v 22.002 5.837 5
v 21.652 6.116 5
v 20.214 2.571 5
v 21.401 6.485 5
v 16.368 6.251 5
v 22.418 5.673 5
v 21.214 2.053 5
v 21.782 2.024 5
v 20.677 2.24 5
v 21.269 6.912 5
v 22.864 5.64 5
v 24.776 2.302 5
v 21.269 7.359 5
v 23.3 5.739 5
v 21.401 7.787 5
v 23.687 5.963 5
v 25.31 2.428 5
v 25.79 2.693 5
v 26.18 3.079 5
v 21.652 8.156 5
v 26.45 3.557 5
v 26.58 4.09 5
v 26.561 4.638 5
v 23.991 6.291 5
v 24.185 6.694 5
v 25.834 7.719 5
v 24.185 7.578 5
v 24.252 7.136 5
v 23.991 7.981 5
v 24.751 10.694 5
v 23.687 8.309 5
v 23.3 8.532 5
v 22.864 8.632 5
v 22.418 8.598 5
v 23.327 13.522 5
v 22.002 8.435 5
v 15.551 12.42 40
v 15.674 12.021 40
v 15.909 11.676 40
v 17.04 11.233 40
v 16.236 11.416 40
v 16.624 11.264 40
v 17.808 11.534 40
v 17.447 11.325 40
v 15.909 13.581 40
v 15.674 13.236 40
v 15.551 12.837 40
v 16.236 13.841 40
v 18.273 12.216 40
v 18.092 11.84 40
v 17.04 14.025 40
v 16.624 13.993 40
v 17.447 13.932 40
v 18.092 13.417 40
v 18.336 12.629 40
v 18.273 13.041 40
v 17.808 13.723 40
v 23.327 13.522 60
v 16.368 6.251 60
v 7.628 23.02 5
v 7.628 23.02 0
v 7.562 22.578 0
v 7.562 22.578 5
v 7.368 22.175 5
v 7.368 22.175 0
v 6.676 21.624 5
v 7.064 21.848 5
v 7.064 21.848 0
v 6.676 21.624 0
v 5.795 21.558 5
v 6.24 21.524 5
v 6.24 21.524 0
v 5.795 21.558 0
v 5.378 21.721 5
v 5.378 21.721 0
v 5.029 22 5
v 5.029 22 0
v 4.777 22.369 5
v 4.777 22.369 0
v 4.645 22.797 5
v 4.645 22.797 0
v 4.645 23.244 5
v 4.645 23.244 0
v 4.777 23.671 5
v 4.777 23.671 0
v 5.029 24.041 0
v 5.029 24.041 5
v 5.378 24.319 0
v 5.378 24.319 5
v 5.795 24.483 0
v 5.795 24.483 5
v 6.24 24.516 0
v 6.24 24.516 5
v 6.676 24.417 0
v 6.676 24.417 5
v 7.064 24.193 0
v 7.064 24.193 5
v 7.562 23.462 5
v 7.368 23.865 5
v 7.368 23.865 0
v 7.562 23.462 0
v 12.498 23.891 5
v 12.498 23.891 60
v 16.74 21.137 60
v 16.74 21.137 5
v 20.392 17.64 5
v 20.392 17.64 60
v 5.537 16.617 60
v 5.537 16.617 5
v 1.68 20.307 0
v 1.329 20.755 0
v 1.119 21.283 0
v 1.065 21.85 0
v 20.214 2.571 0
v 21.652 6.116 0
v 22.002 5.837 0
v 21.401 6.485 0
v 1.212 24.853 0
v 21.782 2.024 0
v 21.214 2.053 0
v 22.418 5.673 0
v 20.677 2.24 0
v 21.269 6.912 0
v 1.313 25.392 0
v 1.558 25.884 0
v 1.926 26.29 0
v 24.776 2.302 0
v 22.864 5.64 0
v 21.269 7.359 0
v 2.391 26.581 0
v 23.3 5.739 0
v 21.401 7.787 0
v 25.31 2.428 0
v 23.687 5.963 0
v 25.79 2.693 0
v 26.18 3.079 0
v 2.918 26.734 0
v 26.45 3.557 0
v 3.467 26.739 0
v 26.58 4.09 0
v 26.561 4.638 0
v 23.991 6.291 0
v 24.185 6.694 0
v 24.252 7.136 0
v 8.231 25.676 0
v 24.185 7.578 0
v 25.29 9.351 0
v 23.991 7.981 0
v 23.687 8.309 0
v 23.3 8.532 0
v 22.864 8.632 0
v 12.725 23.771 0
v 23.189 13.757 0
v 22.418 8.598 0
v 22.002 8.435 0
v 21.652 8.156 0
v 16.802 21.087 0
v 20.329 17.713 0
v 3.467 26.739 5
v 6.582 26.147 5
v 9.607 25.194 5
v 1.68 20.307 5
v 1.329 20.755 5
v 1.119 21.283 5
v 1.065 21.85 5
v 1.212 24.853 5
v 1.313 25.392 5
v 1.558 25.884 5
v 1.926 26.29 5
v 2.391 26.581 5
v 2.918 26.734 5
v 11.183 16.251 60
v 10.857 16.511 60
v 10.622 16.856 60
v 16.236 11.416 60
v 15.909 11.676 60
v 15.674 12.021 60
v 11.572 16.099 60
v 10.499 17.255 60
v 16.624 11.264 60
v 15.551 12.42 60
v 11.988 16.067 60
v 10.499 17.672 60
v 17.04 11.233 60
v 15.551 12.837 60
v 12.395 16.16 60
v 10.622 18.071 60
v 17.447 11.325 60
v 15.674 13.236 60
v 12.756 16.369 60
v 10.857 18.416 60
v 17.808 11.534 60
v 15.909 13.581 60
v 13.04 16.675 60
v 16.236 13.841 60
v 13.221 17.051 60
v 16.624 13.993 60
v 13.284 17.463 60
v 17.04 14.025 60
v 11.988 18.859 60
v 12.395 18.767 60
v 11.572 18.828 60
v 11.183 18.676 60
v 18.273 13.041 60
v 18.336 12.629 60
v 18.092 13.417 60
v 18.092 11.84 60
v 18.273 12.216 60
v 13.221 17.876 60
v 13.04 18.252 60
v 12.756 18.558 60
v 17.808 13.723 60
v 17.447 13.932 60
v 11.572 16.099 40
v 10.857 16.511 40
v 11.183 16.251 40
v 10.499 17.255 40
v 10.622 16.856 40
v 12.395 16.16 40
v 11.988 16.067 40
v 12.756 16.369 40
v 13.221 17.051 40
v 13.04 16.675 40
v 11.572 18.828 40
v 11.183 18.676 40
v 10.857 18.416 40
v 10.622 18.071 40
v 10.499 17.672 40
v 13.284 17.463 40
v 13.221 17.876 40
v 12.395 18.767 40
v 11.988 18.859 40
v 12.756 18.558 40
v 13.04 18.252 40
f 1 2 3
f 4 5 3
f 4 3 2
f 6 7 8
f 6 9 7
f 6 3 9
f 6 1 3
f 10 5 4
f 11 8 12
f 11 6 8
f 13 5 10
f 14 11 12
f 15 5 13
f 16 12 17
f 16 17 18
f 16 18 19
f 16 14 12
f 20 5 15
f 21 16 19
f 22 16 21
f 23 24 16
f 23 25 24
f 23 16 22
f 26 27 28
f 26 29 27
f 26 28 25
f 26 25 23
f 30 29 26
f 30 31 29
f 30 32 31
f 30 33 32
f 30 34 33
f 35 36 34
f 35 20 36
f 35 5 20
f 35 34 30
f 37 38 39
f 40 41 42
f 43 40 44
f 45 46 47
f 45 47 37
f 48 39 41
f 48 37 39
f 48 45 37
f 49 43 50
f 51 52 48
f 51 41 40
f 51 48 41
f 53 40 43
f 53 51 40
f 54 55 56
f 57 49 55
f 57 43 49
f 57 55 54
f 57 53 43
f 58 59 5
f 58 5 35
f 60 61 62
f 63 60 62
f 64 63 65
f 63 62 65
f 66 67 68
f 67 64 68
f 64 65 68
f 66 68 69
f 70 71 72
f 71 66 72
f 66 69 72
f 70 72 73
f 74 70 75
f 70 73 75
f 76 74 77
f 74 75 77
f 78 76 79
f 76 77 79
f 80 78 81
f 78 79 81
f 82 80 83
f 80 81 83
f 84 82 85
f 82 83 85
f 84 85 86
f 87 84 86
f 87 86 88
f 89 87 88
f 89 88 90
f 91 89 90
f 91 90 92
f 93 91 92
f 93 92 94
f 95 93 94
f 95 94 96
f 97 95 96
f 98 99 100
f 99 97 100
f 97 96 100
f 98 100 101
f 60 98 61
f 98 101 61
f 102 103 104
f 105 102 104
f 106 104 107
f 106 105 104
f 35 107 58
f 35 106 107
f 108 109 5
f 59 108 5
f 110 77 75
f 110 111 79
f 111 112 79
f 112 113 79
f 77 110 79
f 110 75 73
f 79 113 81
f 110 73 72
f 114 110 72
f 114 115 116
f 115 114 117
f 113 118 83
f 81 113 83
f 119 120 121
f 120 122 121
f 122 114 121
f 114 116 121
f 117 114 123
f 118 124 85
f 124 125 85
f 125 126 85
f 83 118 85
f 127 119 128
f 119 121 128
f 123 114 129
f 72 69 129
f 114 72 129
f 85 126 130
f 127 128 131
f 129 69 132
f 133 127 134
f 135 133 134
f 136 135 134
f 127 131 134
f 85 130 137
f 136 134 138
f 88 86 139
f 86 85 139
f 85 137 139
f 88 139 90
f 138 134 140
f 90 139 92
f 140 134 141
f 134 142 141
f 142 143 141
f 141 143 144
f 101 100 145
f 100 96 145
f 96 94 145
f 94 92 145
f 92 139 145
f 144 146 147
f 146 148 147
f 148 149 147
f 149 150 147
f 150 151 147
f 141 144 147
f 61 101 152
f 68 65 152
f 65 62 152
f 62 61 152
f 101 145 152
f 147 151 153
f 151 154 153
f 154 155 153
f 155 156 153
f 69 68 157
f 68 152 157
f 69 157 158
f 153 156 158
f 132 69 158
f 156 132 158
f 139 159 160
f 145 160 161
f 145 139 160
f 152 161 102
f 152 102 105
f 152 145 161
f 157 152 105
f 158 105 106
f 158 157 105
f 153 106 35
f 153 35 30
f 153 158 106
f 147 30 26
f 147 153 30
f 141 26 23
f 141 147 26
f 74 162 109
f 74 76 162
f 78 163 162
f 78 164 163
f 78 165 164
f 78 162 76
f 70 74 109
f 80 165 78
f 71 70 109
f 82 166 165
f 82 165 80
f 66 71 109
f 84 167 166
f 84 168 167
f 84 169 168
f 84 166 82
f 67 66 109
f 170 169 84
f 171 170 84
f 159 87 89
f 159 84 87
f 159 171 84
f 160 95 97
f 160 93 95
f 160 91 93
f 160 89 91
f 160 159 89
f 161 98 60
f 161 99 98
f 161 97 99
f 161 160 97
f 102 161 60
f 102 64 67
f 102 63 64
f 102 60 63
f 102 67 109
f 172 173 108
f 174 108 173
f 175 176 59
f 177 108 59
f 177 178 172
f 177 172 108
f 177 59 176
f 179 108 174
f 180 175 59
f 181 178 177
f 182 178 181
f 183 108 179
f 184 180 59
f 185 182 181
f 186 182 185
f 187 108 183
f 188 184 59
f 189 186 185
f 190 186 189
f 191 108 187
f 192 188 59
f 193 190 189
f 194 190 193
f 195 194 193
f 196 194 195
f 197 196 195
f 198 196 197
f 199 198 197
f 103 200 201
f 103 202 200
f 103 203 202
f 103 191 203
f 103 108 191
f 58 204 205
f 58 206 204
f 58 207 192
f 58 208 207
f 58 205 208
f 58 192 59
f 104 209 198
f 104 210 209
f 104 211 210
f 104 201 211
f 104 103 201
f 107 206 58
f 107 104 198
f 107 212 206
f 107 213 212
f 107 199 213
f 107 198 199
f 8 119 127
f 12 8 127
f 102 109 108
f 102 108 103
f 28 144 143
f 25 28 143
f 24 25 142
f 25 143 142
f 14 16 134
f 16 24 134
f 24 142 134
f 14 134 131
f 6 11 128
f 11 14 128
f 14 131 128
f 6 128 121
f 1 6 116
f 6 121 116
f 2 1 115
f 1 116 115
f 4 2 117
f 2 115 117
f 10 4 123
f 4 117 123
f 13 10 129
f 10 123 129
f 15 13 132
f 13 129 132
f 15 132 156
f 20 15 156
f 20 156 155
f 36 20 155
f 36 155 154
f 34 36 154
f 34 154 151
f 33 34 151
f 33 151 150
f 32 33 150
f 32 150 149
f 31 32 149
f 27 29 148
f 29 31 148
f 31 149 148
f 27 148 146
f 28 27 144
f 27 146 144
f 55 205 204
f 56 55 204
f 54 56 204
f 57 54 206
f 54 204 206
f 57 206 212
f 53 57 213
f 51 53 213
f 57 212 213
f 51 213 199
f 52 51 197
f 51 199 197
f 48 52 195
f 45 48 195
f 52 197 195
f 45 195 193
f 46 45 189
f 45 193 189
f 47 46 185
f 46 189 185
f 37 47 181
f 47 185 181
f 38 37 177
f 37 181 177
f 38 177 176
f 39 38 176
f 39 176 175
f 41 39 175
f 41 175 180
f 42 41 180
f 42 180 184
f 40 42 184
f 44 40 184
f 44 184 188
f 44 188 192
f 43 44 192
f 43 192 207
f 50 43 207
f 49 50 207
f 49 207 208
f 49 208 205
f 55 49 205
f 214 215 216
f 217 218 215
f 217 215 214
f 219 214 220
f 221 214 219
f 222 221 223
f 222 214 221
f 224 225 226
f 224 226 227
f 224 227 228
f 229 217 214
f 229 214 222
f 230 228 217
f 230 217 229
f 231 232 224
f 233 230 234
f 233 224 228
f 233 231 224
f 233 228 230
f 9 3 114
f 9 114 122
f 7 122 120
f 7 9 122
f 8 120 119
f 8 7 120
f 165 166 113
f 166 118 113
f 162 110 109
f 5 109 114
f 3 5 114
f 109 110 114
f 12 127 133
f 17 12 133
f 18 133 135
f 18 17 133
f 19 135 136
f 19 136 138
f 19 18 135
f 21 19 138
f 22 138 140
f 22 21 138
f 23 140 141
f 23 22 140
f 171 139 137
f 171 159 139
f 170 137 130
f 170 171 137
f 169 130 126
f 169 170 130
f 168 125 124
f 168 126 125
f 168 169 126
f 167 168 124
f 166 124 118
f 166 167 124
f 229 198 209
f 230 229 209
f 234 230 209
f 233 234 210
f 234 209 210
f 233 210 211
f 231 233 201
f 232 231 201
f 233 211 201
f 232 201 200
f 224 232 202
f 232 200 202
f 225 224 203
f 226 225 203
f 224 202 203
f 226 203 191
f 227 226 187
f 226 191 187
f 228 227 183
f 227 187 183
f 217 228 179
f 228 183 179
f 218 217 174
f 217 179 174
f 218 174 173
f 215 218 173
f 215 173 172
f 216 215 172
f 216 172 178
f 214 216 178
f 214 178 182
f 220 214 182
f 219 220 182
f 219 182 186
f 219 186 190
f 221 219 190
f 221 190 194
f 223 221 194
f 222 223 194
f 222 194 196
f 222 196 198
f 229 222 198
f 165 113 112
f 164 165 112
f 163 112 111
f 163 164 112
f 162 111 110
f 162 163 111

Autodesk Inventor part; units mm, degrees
ref_plane "YZ Plane" through (0, 0, 0) normal (1, 0, 0) x (0, 1, 0)
ref_plane "XZ Plane" through (0, 0, 0) normal (0, 1, 0) x (-1, 0, 0)
ref_plane "XY Plane" through (0, 0, 0) normal (0, 0, 1) x (1, 0, 0)
ref_plane "Arbeitsebene1" through (0, 0, 0) normal (0, 0, 1) x (1, 0, 0)
sketch "Skizze1" plane through (0, 0, 0) normal (0, 0, 1) x (1, 0, 0)
  circle A0 centre (-8.37, 7.9978) radius 1.4 projected
  circle A1 centre (8.3745, -8.0022) radius 1.4 projected
  spline S0 degree 2 poles (24.1427, 2.2394) (24.731, 1.8489) (25.3785, 0.5587) (25.3785, -0.3311) knots 0 0 0 1 2 2 2 projected
  spline S1 degree 2 poles (25.3785, -0.3311) (25.3785, -1.1665) (24.7013, -2.5111) (24.1328, -2.8868) knots 0 0 0 1 2 2 2 projected
  spline S2 degree 2 poles (24.1328, -2.8868) (23.6682, -3.1784) (22.7141, -3.3761) (21.9726, -3.3761) knots 0 0 0 1 2 2 2 projected
  line L0 (21.9726, -3.3761) -> (20.5687, -3.3761) projected
  line L1 (20.5687, -3.3761) -> (20.5687, 2.7239) projected
  line L2 (20.5687, 2.7239) -> (21.9578, 2.7239) projected
  spline S3 degree 2 poles (21.9578, 2.7239) (22.8179, 2.7239) (23.7967, 2.4668) (24.1427, 2.2394) knots 0 0 0 1 2 2 2 projected
  spline S4 degree 2 poles (19.1896, -2.9312) (18.8979, -3.1982) (18.1564, -3.4849) (17.5978, -3.4849) knots 0 0 0 1 2 2 2 projected
  spline S5 degree 2 poles (17.5978, -3.4849) (16.9354, -3.4849) (16.0061, -3.2081) (15.5958, -3.0103) knots 0 0 0 1 2 2 2 projected
  line L3 (15.5958, -3.0103) -> (15.5958, -1.992) projected
  line L4 (15.5958, -1.992) -> (15.6551, -1.992) projected
  spline S6 degree 2 poles (15.6551, -1.992) (16.0555, -2.3677) (17.0689, -2.783) (17.5385, -2.783) knots 0 0 0 1 2 2 2 projected
  spline S7 degree 2 poles (17.5385, -2.783) (18.2108, -2.783) (18.8979, -2.2244) (18.8979, -1.7646) knots 0 0 0 1 2 2 2 projected
  spline S8 degree 2 poles (18.8979, -1.7646) (18.8979, -1.3988) (18.5371, -0.9441) (18.1465, -0.8304) knots 0 0 0 1 2 2 2 projected
  spline S9 degree 2 poles (18.1465, -0.8304) (17.8648, -0.7513) (17.3952, -0.6425) (17.0442, -0.5535) knots 0 0 0 1 2 2 2 projected
  spline S10 degree 2 poles (17.0442, -0.5535) (16.7278, -0.4695) (16.2285, -0.2174) (16.0358, -0.0147) knots 0 0 0 1 2 2 2 projected
  spline S11 degree 2 poles (16.0358, -0.0147) (15.8479, 0.188) (15.6403, 0.7317) (15.6403, 1.0876) knots 0 0 0 1 2 2 2 projected
  spline S12 degree 2 poles (15.6403, 1.0876) (15.6403, 1.8291) (16.797, 2.8326) (17.6918, 2.8326) knots 0 0 0 1 2 2 2 projected
  spline S13 degree 2 poles (17.6918, 2.8326) (18.2059, 2.8326) (19.1154, 2.6299) (19.5059, 2.4371) knots 0 0 0 1 2 2 2 projected
  line L5 (19.5059, 2.4371) -> (19.5059, 1.4683) projected
  line L6 (19.5059, 1.4683) -> (19.4466, 1.4683) projected
  spline S14 degree 2 poles (19.4466, 1.4683) (19.155, 1.7352) (18.2454, 2.1307) (17.7461, 2.1307) knots 0 0 0 1 2 2 2 projected
  spline S15 degree 2 poles (17.7461, 2.1307) (17.1826, 2.1307) (16.4856, 1.6017) (16.4856, 1.1717) knots 0 0 0 1 2 2 2 projected
  spline S16 degree 2 poles (16.4856, 1.1717) (16.4856, 0.7861) (16.8959, 0.3264) (17.2815, 0.2226) knots 0 0 0 1 2 2 2 projected
  spline S17 degree 2 poles (17.2815, 0.2226) (17.5385, 0.1534) (18.285, -0.0246) (18.5321, -0.0988) knots 0 0 0 1 2 2 2 projected
  spline S18 degree 2 poles (18.5321, -0.0988) (19.1599, -0.2915) (19.7432, -1.0676) (19.7432, -1.6361) knots 0 0 0 1 2 2 2 projected
  spline S19 degree 2 poles (19.7432, -1.6361) (19.7432, -1.997) (19.4516, -2.689) (19.1896, -2.9312) knots 0 0 0 1 2 2 2 projected
  line L7 (-17.7002, -6.4434) -> (-23.8502, -6.4434) projected
  arc A2 (-23.8502, -6.4434) -> (-24.8892, -7.3274) centre (-23.8502, -7.496) ccw projected
  arc A3 (-25.1732, 6.2825) -> (-24.1417, 5.4391) centre (-24.1417, 6.4917) ccw projected
  line L8 (-24.1417, 5.4391) -> (-17.7002, 5.4391) projected
  arc A4 (-15.7528, 3.4917) -> (-17.7002, 5.4391) centre (-17.7002, 3.4917) ccw projected
  line L9 (-15.7528, 3.4917) -> (-15.7528, -4.496) projected
  arc A5 (-17.7002, -6.4434) -> (-15.7528, -4.496) centre (-17.7002, -4.496) ccw projected
  circle A6 centre (-16.3217, -17.1216) radius 2.05 projected
  circle A7 centre (6.1284, 23.0203) radius 2.05 projected
  circle A8 centre (22.752, 7.1358) radius 2.05 projected
  circle A9 centre (-9.4998, -11.0022) radius 4 projected
  circle A10 centre (0.0001, -0.0022) radius 7.5 projected
  circle A11 centre (0, 0) radius 26.963
  circle A12 centre (0, 0) radius 20.963
  line L10 (1.3131, 26.931) -> (1.0209, 20.9381)
  line L11 (20.8731, 1.9397) -> (26.8473, 2.4948)
  circle A13 centre (6.1284, 23.0203) radius 1.5
  circle A14 centre (22.752, 7.1358) radius 1.5
  line L12 (1.0209, 20.9381) -> (20.8731, 1.9397)
  circle A15 centre (-13.4016, 13.4684) radius 4 projected
  circle A16 centre (13.3298, -13.5395) radius 4 projected
  line L13 (-25.1732, 9.0483) -> (-25.1732, 6.2825) projected
  line L14 (-24.8892, -7.3274) -> (-24.8892, -9.8026) projected
  arc A17 (-24.8892, -9.8026) -> (-25.1732, 9.0483) centre (0, 0) ccw projected
  point P0 (0, 0)
  point P1 (20.7853, 2.7239)
  point P2 (24.1373, 2.243)
  point P3 (20.5687, 2.2309)
  dimension "d1" = 6
  dimension "d2" = 5
  dimension "d3" = 5
  dimension "d6" = 3
  dimension "d7" = 3
extrude "Extrusion1" add sketch "Skizze1" along normal blind 5 contours L11 A12 L2 S3 | S3 L2 A12 L10 A17 L11 | L12 L1 L2 A12 | A17 L10 A11 L11 | L2 L1 L12 A12 | A7 | A8
fillet "Rundung1" radius 2 4 edges at (1.0209, 20.9381, 2.5) (1.3131, 26.931, 2.5) (20.8731, 1.9397, 2.5) (26.8473, 2.4948, 2.5)
sketch "Skizze2" plane through (0, 0, 5) normal (0, 0, 1) x (1, 0, 0)
  arc A0 (24.776, 2.3024) -> (26.5611, 4.6378) centre (24.5909, 4.2938) ccw projected
  arc A1 (26.5611, 4.6378) -> (3.4665, 26.7392) centre (0, 0) ccw projected
  arc A2 (3.4665, 26.7392) -> (1.2118, 24.8532) centre (3.2094, 24.7558) ccw projected
  line L0 (1.2118, 24.8532) -> (1.0653, 21.8495) projected
  arc A3 (1.0653, 21.8495) -> (1.6802, 20.3072) centre (3.063, 21.7521) ccw projected
  line L1 (1.6802, 20.3072) -> (20.2138, 2.5706) projected
  arc A4 (20.2138, 2.5706) -> (21.7817, 2.0241) centre (21.5966, 4.0155) ccw projected
  line L2 (21.7817, 2.0241) -> (24.776, 2.3024) projected
  circle A5 centre (6.1284, 23.0203) radius 1.5 projected
  circle A6 centre (22.752, 7.1358) radius 1.5 projected
  line L3 (1.6802, 20.3072) -> (20.2138, 2.5706) projected
  line L4 (5.5366, 16.6166) -> (12.4984, 23.8913)
  line L5 (16.3684, 6.2506) -> (23.3271, 13.5221)
  point P0 (0, 0)
  dimension "d9" = 4
  dimension "d10" = 4
extrude "Extrusion2" add sketch "Skizze2" along normal blind 55 contours L5 L1 L4 A1
sketch "Skizze3" plane through (0, 0, 60) normal (0, 0, 1) x (1, 0, 0)
  arc A0 (23.3271, 13.5221) -> (12.4984, 23.8913) centre (0, 0) ccw projected
  line L0 (12.4984, 23.8913) -> (5.5366, 16.6166) projected
  line L1 (5.5366, 16.6166) -> (16.3684, 6.2506) projected
  line L2 (16.3684, 6.2506) -> (23.3271, 13.5221) projected
  circle A1 centre (11.8835, 17.4634) radius 1.4
  circle A2 centre (16.9355, 12.6286) radius 1.4
  point P0 (0, 0)
  dimension "d13" = 2.8
  dimension "d14" = 2.8
  dimension "d15" = 4
  dimension "d16" = 4
  dimension "d17" = 5
  dimension "d18" = 5
extrude "Extrusion3" cut sketch "Skizze3" against normal blind 20 contours A1 | A2
properties part number "IM_Matchboxscope_Laserholder"
